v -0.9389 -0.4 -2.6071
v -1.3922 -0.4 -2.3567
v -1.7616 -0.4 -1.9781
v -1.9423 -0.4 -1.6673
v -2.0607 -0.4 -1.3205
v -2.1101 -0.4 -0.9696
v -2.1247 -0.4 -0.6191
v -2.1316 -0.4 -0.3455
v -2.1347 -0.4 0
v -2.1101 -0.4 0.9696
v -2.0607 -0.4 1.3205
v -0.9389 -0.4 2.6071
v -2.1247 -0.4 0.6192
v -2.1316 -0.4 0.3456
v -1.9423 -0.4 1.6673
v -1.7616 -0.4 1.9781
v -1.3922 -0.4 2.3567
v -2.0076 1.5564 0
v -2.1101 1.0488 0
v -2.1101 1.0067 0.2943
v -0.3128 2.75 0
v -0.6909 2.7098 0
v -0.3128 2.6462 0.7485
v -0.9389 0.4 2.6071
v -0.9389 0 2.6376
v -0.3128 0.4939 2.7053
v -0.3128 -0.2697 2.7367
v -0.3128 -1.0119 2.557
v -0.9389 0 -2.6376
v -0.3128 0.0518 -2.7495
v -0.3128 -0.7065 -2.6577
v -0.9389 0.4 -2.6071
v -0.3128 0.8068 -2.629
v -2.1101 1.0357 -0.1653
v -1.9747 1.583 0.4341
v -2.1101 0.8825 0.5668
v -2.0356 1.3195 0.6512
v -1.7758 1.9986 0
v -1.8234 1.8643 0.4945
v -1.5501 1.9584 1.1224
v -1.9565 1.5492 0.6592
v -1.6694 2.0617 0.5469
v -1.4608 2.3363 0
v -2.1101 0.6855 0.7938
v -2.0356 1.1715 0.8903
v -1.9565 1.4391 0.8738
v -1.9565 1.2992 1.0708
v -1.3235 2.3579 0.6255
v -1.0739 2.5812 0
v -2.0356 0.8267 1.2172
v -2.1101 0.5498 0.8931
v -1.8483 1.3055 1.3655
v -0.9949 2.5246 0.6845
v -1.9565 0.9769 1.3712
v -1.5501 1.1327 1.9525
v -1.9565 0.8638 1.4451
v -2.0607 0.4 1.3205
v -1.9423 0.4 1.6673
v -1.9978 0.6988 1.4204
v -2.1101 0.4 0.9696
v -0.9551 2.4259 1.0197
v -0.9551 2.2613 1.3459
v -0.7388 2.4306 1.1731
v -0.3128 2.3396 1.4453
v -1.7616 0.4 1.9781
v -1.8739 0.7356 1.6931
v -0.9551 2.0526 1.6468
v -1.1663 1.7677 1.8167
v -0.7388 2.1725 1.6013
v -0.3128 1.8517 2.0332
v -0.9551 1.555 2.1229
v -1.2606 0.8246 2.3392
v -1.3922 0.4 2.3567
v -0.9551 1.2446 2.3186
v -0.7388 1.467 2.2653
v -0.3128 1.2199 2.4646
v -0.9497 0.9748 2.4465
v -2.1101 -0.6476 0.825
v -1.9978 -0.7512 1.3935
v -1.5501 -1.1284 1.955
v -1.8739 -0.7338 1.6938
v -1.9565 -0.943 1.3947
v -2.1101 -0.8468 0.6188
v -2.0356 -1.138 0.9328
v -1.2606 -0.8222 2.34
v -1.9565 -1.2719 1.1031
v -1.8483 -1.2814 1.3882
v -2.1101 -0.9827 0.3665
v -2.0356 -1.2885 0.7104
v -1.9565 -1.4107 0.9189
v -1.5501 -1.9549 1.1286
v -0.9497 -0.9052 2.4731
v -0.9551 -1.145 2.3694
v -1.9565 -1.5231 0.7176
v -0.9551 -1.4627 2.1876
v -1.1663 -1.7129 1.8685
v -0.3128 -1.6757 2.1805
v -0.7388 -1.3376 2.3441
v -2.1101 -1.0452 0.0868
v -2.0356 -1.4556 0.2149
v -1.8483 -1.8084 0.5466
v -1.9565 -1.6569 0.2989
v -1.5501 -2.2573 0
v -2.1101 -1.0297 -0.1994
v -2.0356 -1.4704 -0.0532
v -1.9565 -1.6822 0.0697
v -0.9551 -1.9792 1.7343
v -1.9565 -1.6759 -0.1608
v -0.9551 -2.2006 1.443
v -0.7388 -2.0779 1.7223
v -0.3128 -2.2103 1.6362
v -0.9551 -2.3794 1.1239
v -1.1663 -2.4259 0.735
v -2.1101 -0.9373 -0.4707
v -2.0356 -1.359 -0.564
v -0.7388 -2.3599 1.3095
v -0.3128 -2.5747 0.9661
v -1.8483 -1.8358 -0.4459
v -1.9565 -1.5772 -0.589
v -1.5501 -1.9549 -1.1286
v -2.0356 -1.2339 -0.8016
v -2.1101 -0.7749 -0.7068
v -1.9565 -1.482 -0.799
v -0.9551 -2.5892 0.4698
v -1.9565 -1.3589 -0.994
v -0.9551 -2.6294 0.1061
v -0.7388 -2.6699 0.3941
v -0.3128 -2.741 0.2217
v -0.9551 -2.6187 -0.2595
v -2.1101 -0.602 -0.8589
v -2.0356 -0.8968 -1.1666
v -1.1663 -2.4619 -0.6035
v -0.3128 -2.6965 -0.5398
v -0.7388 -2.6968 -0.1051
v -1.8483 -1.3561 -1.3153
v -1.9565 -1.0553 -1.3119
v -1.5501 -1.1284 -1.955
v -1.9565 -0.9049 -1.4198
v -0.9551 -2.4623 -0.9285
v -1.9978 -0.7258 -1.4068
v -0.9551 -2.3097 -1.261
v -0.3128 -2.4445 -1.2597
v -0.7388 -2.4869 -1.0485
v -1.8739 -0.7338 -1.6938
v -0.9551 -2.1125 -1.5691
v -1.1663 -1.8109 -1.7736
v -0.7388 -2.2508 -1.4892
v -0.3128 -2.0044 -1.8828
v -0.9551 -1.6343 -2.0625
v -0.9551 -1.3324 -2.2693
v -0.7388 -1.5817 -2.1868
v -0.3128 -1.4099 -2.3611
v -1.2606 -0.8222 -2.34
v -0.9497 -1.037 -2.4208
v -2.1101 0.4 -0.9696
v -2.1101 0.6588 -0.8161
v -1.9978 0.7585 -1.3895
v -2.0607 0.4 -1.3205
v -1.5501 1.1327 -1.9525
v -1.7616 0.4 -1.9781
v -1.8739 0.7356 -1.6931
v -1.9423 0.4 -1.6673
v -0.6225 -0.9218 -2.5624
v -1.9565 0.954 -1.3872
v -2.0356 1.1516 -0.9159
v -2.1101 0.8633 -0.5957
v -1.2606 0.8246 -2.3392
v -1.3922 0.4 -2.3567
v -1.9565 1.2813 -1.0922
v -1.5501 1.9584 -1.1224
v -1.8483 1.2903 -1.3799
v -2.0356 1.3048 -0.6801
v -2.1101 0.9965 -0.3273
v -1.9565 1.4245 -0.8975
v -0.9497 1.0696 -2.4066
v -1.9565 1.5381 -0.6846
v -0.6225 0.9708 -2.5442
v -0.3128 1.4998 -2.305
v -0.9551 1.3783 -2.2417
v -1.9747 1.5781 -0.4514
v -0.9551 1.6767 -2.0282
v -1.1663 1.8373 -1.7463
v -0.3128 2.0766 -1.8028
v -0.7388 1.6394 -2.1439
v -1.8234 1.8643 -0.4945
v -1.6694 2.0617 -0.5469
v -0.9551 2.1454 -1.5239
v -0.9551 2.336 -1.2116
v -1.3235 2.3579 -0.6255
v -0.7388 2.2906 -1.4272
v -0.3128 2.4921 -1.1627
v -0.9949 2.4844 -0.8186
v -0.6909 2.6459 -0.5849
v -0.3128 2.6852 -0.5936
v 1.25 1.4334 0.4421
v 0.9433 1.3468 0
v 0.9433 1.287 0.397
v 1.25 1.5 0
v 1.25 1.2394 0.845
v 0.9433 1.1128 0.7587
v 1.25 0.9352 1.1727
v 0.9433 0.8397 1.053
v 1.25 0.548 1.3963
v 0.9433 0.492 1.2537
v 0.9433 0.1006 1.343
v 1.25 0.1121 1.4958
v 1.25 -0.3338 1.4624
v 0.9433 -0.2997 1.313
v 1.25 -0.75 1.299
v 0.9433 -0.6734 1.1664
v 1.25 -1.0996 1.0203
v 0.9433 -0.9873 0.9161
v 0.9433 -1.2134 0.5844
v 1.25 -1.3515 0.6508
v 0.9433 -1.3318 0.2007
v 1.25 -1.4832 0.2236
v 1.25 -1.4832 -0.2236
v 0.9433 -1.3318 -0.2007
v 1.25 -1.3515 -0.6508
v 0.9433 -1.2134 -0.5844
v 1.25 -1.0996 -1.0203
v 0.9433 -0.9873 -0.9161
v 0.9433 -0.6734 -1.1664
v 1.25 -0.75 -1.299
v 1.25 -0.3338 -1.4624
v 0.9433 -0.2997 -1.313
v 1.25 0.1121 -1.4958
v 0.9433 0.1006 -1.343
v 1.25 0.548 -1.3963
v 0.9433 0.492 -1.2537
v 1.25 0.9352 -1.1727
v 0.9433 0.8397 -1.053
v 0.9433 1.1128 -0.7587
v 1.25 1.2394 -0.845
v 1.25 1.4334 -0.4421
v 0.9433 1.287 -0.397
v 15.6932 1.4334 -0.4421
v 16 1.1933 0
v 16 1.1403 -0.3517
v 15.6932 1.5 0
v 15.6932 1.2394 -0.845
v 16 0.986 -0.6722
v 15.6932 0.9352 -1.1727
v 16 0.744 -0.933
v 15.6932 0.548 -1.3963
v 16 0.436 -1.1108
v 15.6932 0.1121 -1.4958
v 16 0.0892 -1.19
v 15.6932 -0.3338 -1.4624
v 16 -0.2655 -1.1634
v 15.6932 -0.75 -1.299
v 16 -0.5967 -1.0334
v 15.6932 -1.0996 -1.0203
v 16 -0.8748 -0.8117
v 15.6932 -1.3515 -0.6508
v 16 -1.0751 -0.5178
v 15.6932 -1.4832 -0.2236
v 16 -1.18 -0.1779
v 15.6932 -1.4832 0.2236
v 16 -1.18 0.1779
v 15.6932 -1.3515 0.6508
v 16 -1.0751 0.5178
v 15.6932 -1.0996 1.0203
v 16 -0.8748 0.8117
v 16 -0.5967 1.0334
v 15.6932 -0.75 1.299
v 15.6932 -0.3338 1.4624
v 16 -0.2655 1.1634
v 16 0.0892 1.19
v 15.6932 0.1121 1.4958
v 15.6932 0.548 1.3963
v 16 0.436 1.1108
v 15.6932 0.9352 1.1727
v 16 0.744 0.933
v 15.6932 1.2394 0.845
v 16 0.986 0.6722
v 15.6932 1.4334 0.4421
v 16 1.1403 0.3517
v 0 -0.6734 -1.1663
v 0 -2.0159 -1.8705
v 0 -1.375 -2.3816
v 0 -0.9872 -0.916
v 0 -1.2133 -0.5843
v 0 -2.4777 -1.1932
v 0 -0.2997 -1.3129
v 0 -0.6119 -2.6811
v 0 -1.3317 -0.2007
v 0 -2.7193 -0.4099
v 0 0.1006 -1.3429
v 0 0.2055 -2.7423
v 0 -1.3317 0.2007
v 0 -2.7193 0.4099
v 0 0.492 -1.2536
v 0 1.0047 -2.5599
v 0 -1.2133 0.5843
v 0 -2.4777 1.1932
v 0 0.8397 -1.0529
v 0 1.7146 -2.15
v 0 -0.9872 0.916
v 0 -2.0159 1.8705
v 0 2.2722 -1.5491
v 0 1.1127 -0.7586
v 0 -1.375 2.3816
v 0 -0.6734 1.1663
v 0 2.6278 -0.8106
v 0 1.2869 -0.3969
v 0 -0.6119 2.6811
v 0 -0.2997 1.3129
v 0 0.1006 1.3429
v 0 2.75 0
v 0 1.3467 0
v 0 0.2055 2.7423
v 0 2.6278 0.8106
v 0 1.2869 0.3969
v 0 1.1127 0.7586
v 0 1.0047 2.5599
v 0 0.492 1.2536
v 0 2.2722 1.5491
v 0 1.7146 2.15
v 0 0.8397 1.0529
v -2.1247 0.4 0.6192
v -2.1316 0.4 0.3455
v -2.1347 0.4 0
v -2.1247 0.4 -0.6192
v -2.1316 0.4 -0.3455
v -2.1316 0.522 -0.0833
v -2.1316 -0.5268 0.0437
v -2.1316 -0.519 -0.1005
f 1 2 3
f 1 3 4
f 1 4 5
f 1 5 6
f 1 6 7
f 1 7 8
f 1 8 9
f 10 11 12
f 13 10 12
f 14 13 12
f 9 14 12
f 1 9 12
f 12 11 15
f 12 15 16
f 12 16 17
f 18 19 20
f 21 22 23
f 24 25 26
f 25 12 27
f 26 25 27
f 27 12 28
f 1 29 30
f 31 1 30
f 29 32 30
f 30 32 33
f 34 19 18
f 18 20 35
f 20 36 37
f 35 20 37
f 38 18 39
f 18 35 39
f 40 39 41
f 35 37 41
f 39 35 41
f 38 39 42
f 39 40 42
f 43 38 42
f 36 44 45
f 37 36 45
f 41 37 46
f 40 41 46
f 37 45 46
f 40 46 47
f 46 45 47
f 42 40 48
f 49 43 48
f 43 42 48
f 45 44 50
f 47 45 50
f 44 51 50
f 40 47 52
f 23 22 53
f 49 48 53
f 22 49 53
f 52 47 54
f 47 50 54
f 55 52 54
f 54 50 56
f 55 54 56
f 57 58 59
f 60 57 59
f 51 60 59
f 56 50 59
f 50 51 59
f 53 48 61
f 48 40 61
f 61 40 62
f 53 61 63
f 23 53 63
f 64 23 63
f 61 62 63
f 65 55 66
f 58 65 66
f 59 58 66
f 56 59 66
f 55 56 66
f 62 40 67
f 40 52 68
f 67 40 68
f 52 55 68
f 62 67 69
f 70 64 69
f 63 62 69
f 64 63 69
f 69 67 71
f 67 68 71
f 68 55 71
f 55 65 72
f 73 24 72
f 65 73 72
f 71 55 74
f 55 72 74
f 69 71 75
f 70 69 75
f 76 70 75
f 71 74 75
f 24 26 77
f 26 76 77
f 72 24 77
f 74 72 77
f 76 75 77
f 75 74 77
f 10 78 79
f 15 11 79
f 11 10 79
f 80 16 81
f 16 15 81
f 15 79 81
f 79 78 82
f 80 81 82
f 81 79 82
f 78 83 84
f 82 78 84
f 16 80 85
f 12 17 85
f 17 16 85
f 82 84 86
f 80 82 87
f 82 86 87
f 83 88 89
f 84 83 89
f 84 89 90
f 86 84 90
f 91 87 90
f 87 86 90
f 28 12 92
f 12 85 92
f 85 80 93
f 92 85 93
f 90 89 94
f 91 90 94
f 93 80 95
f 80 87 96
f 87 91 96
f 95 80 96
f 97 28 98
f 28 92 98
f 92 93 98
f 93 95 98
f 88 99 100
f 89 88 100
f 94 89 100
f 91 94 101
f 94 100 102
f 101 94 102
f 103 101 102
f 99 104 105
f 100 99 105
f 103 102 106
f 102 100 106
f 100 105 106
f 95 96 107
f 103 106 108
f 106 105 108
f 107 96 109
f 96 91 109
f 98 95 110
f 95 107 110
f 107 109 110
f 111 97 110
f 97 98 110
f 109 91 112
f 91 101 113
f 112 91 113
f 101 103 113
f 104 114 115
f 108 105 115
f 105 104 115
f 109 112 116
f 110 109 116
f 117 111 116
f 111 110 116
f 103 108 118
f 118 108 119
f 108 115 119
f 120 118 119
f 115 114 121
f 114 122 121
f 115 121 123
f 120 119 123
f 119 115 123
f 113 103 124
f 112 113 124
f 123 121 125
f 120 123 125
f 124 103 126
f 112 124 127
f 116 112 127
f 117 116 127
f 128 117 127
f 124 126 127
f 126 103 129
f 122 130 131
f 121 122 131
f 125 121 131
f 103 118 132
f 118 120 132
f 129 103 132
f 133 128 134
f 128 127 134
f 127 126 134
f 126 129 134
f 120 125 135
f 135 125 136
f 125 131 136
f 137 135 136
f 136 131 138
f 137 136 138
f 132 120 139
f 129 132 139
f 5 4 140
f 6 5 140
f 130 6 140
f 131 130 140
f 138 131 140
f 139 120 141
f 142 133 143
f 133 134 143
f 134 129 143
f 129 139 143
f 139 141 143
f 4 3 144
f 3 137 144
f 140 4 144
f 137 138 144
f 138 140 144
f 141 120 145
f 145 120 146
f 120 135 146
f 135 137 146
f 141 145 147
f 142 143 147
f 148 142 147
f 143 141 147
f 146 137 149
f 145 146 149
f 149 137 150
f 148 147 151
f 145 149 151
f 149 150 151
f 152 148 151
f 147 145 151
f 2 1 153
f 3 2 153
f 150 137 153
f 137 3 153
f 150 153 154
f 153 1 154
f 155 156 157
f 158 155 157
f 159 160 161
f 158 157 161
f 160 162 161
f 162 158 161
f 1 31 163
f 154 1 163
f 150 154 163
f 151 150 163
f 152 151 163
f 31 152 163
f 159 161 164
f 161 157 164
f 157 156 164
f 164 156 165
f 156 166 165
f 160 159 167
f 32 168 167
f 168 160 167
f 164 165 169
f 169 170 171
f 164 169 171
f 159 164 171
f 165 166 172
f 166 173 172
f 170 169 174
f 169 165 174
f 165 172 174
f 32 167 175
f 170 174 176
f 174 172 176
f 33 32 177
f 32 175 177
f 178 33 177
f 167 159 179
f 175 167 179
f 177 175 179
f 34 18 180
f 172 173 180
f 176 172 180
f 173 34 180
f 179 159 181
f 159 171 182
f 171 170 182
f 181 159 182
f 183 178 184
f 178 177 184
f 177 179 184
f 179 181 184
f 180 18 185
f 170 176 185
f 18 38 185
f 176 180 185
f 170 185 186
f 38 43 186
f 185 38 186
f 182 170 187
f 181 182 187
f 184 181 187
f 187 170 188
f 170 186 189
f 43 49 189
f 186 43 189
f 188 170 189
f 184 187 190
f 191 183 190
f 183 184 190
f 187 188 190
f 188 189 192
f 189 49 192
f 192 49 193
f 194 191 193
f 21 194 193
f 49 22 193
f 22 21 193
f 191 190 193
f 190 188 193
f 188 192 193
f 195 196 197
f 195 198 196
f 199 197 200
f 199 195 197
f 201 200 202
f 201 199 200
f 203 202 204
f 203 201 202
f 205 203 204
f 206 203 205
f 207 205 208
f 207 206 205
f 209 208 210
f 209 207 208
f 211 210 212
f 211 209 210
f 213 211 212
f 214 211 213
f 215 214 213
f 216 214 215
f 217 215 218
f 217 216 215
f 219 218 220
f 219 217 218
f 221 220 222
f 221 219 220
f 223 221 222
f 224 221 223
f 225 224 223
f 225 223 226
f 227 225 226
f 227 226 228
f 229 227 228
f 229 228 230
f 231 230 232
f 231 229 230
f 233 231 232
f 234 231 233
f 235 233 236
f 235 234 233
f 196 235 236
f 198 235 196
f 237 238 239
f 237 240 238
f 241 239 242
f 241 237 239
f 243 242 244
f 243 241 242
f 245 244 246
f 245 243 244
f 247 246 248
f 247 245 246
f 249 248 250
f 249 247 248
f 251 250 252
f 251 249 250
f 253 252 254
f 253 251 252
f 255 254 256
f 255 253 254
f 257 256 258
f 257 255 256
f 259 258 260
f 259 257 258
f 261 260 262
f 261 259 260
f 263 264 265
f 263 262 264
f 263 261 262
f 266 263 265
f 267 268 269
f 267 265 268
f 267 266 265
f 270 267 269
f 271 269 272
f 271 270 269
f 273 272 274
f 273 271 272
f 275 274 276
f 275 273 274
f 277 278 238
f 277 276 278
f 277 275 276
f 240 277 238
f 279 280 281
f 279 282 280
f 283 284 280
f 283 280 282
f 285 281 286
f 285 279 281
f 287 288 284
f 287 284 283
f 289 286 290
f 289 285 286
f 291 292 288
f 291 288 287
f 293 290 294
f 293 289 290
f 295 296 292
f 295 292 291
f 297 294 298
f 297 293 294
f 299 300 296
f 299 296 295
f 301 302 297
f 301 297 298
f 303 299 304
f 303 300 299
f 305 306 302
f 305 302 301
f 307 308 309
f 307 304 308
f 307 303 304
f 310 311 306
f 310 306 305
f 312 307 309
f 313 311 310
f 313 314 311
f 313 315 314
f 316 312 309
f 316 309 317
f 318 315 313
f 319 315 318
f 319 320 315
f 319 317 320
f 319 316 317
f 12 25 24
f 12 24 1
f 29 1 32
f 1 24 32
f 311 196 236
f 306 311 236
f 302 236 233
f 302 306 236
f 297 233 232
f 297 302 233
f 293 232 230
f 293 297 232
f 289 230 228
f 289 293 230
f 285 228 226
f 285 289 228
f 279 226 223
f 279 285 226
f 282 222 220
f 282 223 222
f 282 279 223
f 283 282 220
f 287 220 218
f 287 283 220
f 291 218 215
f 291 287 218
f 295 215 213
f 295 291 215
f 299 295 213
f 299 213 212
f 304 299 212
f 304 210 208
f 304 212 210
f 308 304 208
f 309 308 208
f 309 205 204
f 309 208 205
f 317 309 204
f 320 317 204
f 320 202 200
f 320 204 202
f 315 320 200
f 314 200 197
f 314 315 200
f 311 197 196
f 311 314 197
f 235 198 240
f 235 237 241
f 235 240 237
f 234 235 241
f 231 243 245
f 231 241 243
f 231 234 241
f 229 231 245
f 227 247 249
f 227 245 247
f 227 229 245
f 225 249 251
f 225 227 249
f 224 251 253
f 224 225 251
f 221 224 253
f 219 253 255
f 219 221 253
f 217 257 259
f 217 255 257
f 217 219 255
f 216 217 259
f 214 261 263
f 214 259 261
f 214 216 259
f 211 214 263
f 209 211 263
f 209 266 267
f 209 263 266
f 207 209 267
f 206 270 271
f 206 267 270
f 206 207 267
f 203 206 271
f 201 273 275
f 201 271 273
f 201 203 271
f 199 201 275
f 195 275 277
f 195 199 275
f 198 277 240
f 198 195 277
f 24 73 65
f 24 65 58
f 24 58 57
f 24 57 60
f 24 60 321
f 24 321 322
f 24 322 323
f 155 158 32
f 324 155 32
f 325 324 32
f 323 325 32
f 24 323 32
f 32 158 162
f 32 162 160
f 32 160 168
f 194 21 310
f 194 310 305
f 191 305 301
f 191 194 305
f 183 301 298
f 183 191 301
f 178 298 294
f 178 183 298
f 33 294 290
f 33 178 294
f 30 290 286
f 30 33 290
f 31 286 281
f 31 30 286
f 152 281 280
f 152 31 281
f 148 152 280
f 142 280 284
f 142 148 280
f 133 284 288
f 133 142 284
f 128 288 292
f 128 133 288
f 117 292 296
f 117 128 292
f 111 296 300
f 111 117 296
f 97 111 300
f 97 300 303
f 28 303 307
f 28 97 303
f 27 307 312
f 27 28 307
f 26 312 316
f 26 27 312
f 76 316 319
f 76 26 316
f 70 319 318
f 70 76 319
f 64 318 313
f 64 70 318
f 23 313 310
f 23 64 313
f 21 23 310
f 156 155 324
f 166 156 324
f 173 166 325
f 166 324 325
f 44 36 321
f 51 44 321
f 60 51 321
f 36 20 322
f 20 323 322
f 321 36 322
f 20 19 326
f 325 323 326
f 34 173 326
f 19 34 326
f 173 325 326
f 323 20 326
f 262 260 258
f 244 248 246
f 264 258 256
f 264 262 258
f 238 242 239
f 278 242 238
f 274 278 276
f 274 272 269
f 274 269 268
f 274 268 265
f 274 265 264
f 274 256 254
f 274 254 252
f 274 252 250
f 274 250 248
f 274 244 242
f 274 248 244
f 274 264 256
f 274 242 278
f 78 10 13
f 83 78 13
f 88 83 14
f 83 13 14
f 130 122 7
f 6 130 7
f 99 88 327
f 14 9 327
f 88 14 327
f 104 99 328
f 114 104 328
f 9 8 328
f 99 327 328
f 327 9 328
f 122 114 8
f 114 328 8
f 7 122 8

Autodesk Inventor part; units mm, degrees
ref_plane "YZ Plane" through (0, 0, 0) normal (1, 0, 0) x (0, 1, 0)
sketch "Skizze1" plane through (0, 0, 0) normal (0, 0, 1) x (1, 0, 0)
  line L0 (-2.1389, 0) -> (16, 0)
  line L1 (16, 0) -> (16, 1.5)
  line L2 (16, 1.5) -> (1.25, 1.5)
  line L3 (1.25, 1.5) -> (0.9433, 1.3468)
  line L4 (0.9433, 1.3468) -> (0, 1.3467)
  line L5 (0, 1.3467) -> (0, 2.75)
  line L6 (-6.0203, 0) -> (20.8022, 0) projected
  line L7 (0, -0.5507) -> (0, 3.3039) projected
  line L8 (0, 2.75) -> (-1.94, 2.7497)
  arc A0 (-1.94, 2.7497) -> (-2.1389, 0) centre (16.9704, 0) ccw
  dimension "d0" = 16
  dimension "d1" = 14.75
  dimension "d2" = 0.3067
  dimension "d3" = 2.1389
  dimension "d4" = 3
  dimension "d5" = 2.6935
  dimension "d9" = 5.5
  dimension "d10" = 0.01
  dimension "d15" = 19.1093
revolve "Körper" add sketch "Skizze1" angle 360 about axis through (-2.1389, 0, 0) along (1, 0, 0)
fillet "Rundung1" radius 1.8 1 edges at (-1.94, -2.7497, 0)
ref_plane "IDS_WORKPLANE{1}" through (-2.1389, 0, 0) normal (1, 0, 0) x (0, 0, -1)
sketch "Skizze2" plane through (-2.1389, 0, 0) normal (1, 0, 0) x (0, 0, -1)
  line L0 (0, -3.85) -> (0, 3.85) projected
  line L1 (3.85, 0) -> (-3.85, 0) projected
  line L2 (-2.75, 0.4) -> (2.75, 0.4)
  line L3 (2.75, 0.4) -> (2.75, -0.4)
  line L4 (2.75, -0.4) -> (-2.75, -0.4)
  line L5 (-2.75, -0.4) -> (-2.75, 0.4)
  line L6 (0, 0.4) -> (0, -0.4) construction
  line L7 (-2.75, 0) -> (2.75, 0) construction
  circle A0 centre (0, 0) radius 2.75 projected
  dimension "d17" = 0.8
extrude "Loch" cut sketch "Skizze2" along normal blind 1.2 contours L4 A0 L1 L0 | L0 L1 A0 L4 | L4 L5 A0 | A0 L3 L4 | L1 A0 L2 L0 | L0 L2 A0 L1 | L5 L2 A0 | A0 L2 L3
thread "Gewinde" size "M3x0.5" class "6g" standard "ISO Metric profile" length 14.75
chamfer "Fase1" distance 0.3067 distance2 0.3068 1 edges at (16, -1.5, 0) measured on face at (16, 0.481, 0.3876)
ref_plane "Work Plane2" through (8.25, 0, 0) normal (0, 0, -1) x (1, 0, 0)
equation "\"d0\" = NLG"
equation "\"d1\" = GEL"
equation "\"d2\" = GAL"
equation "\"d3\" = KOH"
equation "\"d4\" = GD"
equation "\"d5\" = BDM"
equation "\"d9\" = KOD"
equation "\"d10\" = KEWI"
equation "\"d17\" = SBR"
equation "\"d18\" = STI"
equation "\"d20\" = RR"
equation "\"d11\" = GEL"
equation "\"d13\" = -0.5 * SPD + 0.5 * GD"
equation "\"GD\" = NND"
equation "\"NLG\" = 16"
equation "\"GEL\" = 14.75"
equation "\"KOD\" = 5.5"
equation "\"KOH\" = 2.13889"
equation "\"GAL\" = 0.61345 * PTC"
equation "\"SPD\" = NND - 1.2269 * PTC"
equation "\"BDM\" = 2.6935"
equation "\"GUL\" = 0.61345 * PTC"
equation "\"RR\" = 1.8"
equation "\"SBR\" = 0.8"
equation "\"STI\" = 1.2"
equation "\"KEWI\" = 0.01deg"
equation "\"KR\" = 3.3"
equation "\"d16\" = -KOH"
equation "\"PTC\" = 0.5"
equation "\"THREADDIA\" = 3"
equation "\"TOA\" = 30deg"
equation "\"NND\" = 3"
equation "\"ORI\" = 1.8"
equation "\"GD1\" = THREADDIA - 1.2269 * PTC"
properties part number "CNS 9671 - M3 x 16" material "Steel, Mild"
